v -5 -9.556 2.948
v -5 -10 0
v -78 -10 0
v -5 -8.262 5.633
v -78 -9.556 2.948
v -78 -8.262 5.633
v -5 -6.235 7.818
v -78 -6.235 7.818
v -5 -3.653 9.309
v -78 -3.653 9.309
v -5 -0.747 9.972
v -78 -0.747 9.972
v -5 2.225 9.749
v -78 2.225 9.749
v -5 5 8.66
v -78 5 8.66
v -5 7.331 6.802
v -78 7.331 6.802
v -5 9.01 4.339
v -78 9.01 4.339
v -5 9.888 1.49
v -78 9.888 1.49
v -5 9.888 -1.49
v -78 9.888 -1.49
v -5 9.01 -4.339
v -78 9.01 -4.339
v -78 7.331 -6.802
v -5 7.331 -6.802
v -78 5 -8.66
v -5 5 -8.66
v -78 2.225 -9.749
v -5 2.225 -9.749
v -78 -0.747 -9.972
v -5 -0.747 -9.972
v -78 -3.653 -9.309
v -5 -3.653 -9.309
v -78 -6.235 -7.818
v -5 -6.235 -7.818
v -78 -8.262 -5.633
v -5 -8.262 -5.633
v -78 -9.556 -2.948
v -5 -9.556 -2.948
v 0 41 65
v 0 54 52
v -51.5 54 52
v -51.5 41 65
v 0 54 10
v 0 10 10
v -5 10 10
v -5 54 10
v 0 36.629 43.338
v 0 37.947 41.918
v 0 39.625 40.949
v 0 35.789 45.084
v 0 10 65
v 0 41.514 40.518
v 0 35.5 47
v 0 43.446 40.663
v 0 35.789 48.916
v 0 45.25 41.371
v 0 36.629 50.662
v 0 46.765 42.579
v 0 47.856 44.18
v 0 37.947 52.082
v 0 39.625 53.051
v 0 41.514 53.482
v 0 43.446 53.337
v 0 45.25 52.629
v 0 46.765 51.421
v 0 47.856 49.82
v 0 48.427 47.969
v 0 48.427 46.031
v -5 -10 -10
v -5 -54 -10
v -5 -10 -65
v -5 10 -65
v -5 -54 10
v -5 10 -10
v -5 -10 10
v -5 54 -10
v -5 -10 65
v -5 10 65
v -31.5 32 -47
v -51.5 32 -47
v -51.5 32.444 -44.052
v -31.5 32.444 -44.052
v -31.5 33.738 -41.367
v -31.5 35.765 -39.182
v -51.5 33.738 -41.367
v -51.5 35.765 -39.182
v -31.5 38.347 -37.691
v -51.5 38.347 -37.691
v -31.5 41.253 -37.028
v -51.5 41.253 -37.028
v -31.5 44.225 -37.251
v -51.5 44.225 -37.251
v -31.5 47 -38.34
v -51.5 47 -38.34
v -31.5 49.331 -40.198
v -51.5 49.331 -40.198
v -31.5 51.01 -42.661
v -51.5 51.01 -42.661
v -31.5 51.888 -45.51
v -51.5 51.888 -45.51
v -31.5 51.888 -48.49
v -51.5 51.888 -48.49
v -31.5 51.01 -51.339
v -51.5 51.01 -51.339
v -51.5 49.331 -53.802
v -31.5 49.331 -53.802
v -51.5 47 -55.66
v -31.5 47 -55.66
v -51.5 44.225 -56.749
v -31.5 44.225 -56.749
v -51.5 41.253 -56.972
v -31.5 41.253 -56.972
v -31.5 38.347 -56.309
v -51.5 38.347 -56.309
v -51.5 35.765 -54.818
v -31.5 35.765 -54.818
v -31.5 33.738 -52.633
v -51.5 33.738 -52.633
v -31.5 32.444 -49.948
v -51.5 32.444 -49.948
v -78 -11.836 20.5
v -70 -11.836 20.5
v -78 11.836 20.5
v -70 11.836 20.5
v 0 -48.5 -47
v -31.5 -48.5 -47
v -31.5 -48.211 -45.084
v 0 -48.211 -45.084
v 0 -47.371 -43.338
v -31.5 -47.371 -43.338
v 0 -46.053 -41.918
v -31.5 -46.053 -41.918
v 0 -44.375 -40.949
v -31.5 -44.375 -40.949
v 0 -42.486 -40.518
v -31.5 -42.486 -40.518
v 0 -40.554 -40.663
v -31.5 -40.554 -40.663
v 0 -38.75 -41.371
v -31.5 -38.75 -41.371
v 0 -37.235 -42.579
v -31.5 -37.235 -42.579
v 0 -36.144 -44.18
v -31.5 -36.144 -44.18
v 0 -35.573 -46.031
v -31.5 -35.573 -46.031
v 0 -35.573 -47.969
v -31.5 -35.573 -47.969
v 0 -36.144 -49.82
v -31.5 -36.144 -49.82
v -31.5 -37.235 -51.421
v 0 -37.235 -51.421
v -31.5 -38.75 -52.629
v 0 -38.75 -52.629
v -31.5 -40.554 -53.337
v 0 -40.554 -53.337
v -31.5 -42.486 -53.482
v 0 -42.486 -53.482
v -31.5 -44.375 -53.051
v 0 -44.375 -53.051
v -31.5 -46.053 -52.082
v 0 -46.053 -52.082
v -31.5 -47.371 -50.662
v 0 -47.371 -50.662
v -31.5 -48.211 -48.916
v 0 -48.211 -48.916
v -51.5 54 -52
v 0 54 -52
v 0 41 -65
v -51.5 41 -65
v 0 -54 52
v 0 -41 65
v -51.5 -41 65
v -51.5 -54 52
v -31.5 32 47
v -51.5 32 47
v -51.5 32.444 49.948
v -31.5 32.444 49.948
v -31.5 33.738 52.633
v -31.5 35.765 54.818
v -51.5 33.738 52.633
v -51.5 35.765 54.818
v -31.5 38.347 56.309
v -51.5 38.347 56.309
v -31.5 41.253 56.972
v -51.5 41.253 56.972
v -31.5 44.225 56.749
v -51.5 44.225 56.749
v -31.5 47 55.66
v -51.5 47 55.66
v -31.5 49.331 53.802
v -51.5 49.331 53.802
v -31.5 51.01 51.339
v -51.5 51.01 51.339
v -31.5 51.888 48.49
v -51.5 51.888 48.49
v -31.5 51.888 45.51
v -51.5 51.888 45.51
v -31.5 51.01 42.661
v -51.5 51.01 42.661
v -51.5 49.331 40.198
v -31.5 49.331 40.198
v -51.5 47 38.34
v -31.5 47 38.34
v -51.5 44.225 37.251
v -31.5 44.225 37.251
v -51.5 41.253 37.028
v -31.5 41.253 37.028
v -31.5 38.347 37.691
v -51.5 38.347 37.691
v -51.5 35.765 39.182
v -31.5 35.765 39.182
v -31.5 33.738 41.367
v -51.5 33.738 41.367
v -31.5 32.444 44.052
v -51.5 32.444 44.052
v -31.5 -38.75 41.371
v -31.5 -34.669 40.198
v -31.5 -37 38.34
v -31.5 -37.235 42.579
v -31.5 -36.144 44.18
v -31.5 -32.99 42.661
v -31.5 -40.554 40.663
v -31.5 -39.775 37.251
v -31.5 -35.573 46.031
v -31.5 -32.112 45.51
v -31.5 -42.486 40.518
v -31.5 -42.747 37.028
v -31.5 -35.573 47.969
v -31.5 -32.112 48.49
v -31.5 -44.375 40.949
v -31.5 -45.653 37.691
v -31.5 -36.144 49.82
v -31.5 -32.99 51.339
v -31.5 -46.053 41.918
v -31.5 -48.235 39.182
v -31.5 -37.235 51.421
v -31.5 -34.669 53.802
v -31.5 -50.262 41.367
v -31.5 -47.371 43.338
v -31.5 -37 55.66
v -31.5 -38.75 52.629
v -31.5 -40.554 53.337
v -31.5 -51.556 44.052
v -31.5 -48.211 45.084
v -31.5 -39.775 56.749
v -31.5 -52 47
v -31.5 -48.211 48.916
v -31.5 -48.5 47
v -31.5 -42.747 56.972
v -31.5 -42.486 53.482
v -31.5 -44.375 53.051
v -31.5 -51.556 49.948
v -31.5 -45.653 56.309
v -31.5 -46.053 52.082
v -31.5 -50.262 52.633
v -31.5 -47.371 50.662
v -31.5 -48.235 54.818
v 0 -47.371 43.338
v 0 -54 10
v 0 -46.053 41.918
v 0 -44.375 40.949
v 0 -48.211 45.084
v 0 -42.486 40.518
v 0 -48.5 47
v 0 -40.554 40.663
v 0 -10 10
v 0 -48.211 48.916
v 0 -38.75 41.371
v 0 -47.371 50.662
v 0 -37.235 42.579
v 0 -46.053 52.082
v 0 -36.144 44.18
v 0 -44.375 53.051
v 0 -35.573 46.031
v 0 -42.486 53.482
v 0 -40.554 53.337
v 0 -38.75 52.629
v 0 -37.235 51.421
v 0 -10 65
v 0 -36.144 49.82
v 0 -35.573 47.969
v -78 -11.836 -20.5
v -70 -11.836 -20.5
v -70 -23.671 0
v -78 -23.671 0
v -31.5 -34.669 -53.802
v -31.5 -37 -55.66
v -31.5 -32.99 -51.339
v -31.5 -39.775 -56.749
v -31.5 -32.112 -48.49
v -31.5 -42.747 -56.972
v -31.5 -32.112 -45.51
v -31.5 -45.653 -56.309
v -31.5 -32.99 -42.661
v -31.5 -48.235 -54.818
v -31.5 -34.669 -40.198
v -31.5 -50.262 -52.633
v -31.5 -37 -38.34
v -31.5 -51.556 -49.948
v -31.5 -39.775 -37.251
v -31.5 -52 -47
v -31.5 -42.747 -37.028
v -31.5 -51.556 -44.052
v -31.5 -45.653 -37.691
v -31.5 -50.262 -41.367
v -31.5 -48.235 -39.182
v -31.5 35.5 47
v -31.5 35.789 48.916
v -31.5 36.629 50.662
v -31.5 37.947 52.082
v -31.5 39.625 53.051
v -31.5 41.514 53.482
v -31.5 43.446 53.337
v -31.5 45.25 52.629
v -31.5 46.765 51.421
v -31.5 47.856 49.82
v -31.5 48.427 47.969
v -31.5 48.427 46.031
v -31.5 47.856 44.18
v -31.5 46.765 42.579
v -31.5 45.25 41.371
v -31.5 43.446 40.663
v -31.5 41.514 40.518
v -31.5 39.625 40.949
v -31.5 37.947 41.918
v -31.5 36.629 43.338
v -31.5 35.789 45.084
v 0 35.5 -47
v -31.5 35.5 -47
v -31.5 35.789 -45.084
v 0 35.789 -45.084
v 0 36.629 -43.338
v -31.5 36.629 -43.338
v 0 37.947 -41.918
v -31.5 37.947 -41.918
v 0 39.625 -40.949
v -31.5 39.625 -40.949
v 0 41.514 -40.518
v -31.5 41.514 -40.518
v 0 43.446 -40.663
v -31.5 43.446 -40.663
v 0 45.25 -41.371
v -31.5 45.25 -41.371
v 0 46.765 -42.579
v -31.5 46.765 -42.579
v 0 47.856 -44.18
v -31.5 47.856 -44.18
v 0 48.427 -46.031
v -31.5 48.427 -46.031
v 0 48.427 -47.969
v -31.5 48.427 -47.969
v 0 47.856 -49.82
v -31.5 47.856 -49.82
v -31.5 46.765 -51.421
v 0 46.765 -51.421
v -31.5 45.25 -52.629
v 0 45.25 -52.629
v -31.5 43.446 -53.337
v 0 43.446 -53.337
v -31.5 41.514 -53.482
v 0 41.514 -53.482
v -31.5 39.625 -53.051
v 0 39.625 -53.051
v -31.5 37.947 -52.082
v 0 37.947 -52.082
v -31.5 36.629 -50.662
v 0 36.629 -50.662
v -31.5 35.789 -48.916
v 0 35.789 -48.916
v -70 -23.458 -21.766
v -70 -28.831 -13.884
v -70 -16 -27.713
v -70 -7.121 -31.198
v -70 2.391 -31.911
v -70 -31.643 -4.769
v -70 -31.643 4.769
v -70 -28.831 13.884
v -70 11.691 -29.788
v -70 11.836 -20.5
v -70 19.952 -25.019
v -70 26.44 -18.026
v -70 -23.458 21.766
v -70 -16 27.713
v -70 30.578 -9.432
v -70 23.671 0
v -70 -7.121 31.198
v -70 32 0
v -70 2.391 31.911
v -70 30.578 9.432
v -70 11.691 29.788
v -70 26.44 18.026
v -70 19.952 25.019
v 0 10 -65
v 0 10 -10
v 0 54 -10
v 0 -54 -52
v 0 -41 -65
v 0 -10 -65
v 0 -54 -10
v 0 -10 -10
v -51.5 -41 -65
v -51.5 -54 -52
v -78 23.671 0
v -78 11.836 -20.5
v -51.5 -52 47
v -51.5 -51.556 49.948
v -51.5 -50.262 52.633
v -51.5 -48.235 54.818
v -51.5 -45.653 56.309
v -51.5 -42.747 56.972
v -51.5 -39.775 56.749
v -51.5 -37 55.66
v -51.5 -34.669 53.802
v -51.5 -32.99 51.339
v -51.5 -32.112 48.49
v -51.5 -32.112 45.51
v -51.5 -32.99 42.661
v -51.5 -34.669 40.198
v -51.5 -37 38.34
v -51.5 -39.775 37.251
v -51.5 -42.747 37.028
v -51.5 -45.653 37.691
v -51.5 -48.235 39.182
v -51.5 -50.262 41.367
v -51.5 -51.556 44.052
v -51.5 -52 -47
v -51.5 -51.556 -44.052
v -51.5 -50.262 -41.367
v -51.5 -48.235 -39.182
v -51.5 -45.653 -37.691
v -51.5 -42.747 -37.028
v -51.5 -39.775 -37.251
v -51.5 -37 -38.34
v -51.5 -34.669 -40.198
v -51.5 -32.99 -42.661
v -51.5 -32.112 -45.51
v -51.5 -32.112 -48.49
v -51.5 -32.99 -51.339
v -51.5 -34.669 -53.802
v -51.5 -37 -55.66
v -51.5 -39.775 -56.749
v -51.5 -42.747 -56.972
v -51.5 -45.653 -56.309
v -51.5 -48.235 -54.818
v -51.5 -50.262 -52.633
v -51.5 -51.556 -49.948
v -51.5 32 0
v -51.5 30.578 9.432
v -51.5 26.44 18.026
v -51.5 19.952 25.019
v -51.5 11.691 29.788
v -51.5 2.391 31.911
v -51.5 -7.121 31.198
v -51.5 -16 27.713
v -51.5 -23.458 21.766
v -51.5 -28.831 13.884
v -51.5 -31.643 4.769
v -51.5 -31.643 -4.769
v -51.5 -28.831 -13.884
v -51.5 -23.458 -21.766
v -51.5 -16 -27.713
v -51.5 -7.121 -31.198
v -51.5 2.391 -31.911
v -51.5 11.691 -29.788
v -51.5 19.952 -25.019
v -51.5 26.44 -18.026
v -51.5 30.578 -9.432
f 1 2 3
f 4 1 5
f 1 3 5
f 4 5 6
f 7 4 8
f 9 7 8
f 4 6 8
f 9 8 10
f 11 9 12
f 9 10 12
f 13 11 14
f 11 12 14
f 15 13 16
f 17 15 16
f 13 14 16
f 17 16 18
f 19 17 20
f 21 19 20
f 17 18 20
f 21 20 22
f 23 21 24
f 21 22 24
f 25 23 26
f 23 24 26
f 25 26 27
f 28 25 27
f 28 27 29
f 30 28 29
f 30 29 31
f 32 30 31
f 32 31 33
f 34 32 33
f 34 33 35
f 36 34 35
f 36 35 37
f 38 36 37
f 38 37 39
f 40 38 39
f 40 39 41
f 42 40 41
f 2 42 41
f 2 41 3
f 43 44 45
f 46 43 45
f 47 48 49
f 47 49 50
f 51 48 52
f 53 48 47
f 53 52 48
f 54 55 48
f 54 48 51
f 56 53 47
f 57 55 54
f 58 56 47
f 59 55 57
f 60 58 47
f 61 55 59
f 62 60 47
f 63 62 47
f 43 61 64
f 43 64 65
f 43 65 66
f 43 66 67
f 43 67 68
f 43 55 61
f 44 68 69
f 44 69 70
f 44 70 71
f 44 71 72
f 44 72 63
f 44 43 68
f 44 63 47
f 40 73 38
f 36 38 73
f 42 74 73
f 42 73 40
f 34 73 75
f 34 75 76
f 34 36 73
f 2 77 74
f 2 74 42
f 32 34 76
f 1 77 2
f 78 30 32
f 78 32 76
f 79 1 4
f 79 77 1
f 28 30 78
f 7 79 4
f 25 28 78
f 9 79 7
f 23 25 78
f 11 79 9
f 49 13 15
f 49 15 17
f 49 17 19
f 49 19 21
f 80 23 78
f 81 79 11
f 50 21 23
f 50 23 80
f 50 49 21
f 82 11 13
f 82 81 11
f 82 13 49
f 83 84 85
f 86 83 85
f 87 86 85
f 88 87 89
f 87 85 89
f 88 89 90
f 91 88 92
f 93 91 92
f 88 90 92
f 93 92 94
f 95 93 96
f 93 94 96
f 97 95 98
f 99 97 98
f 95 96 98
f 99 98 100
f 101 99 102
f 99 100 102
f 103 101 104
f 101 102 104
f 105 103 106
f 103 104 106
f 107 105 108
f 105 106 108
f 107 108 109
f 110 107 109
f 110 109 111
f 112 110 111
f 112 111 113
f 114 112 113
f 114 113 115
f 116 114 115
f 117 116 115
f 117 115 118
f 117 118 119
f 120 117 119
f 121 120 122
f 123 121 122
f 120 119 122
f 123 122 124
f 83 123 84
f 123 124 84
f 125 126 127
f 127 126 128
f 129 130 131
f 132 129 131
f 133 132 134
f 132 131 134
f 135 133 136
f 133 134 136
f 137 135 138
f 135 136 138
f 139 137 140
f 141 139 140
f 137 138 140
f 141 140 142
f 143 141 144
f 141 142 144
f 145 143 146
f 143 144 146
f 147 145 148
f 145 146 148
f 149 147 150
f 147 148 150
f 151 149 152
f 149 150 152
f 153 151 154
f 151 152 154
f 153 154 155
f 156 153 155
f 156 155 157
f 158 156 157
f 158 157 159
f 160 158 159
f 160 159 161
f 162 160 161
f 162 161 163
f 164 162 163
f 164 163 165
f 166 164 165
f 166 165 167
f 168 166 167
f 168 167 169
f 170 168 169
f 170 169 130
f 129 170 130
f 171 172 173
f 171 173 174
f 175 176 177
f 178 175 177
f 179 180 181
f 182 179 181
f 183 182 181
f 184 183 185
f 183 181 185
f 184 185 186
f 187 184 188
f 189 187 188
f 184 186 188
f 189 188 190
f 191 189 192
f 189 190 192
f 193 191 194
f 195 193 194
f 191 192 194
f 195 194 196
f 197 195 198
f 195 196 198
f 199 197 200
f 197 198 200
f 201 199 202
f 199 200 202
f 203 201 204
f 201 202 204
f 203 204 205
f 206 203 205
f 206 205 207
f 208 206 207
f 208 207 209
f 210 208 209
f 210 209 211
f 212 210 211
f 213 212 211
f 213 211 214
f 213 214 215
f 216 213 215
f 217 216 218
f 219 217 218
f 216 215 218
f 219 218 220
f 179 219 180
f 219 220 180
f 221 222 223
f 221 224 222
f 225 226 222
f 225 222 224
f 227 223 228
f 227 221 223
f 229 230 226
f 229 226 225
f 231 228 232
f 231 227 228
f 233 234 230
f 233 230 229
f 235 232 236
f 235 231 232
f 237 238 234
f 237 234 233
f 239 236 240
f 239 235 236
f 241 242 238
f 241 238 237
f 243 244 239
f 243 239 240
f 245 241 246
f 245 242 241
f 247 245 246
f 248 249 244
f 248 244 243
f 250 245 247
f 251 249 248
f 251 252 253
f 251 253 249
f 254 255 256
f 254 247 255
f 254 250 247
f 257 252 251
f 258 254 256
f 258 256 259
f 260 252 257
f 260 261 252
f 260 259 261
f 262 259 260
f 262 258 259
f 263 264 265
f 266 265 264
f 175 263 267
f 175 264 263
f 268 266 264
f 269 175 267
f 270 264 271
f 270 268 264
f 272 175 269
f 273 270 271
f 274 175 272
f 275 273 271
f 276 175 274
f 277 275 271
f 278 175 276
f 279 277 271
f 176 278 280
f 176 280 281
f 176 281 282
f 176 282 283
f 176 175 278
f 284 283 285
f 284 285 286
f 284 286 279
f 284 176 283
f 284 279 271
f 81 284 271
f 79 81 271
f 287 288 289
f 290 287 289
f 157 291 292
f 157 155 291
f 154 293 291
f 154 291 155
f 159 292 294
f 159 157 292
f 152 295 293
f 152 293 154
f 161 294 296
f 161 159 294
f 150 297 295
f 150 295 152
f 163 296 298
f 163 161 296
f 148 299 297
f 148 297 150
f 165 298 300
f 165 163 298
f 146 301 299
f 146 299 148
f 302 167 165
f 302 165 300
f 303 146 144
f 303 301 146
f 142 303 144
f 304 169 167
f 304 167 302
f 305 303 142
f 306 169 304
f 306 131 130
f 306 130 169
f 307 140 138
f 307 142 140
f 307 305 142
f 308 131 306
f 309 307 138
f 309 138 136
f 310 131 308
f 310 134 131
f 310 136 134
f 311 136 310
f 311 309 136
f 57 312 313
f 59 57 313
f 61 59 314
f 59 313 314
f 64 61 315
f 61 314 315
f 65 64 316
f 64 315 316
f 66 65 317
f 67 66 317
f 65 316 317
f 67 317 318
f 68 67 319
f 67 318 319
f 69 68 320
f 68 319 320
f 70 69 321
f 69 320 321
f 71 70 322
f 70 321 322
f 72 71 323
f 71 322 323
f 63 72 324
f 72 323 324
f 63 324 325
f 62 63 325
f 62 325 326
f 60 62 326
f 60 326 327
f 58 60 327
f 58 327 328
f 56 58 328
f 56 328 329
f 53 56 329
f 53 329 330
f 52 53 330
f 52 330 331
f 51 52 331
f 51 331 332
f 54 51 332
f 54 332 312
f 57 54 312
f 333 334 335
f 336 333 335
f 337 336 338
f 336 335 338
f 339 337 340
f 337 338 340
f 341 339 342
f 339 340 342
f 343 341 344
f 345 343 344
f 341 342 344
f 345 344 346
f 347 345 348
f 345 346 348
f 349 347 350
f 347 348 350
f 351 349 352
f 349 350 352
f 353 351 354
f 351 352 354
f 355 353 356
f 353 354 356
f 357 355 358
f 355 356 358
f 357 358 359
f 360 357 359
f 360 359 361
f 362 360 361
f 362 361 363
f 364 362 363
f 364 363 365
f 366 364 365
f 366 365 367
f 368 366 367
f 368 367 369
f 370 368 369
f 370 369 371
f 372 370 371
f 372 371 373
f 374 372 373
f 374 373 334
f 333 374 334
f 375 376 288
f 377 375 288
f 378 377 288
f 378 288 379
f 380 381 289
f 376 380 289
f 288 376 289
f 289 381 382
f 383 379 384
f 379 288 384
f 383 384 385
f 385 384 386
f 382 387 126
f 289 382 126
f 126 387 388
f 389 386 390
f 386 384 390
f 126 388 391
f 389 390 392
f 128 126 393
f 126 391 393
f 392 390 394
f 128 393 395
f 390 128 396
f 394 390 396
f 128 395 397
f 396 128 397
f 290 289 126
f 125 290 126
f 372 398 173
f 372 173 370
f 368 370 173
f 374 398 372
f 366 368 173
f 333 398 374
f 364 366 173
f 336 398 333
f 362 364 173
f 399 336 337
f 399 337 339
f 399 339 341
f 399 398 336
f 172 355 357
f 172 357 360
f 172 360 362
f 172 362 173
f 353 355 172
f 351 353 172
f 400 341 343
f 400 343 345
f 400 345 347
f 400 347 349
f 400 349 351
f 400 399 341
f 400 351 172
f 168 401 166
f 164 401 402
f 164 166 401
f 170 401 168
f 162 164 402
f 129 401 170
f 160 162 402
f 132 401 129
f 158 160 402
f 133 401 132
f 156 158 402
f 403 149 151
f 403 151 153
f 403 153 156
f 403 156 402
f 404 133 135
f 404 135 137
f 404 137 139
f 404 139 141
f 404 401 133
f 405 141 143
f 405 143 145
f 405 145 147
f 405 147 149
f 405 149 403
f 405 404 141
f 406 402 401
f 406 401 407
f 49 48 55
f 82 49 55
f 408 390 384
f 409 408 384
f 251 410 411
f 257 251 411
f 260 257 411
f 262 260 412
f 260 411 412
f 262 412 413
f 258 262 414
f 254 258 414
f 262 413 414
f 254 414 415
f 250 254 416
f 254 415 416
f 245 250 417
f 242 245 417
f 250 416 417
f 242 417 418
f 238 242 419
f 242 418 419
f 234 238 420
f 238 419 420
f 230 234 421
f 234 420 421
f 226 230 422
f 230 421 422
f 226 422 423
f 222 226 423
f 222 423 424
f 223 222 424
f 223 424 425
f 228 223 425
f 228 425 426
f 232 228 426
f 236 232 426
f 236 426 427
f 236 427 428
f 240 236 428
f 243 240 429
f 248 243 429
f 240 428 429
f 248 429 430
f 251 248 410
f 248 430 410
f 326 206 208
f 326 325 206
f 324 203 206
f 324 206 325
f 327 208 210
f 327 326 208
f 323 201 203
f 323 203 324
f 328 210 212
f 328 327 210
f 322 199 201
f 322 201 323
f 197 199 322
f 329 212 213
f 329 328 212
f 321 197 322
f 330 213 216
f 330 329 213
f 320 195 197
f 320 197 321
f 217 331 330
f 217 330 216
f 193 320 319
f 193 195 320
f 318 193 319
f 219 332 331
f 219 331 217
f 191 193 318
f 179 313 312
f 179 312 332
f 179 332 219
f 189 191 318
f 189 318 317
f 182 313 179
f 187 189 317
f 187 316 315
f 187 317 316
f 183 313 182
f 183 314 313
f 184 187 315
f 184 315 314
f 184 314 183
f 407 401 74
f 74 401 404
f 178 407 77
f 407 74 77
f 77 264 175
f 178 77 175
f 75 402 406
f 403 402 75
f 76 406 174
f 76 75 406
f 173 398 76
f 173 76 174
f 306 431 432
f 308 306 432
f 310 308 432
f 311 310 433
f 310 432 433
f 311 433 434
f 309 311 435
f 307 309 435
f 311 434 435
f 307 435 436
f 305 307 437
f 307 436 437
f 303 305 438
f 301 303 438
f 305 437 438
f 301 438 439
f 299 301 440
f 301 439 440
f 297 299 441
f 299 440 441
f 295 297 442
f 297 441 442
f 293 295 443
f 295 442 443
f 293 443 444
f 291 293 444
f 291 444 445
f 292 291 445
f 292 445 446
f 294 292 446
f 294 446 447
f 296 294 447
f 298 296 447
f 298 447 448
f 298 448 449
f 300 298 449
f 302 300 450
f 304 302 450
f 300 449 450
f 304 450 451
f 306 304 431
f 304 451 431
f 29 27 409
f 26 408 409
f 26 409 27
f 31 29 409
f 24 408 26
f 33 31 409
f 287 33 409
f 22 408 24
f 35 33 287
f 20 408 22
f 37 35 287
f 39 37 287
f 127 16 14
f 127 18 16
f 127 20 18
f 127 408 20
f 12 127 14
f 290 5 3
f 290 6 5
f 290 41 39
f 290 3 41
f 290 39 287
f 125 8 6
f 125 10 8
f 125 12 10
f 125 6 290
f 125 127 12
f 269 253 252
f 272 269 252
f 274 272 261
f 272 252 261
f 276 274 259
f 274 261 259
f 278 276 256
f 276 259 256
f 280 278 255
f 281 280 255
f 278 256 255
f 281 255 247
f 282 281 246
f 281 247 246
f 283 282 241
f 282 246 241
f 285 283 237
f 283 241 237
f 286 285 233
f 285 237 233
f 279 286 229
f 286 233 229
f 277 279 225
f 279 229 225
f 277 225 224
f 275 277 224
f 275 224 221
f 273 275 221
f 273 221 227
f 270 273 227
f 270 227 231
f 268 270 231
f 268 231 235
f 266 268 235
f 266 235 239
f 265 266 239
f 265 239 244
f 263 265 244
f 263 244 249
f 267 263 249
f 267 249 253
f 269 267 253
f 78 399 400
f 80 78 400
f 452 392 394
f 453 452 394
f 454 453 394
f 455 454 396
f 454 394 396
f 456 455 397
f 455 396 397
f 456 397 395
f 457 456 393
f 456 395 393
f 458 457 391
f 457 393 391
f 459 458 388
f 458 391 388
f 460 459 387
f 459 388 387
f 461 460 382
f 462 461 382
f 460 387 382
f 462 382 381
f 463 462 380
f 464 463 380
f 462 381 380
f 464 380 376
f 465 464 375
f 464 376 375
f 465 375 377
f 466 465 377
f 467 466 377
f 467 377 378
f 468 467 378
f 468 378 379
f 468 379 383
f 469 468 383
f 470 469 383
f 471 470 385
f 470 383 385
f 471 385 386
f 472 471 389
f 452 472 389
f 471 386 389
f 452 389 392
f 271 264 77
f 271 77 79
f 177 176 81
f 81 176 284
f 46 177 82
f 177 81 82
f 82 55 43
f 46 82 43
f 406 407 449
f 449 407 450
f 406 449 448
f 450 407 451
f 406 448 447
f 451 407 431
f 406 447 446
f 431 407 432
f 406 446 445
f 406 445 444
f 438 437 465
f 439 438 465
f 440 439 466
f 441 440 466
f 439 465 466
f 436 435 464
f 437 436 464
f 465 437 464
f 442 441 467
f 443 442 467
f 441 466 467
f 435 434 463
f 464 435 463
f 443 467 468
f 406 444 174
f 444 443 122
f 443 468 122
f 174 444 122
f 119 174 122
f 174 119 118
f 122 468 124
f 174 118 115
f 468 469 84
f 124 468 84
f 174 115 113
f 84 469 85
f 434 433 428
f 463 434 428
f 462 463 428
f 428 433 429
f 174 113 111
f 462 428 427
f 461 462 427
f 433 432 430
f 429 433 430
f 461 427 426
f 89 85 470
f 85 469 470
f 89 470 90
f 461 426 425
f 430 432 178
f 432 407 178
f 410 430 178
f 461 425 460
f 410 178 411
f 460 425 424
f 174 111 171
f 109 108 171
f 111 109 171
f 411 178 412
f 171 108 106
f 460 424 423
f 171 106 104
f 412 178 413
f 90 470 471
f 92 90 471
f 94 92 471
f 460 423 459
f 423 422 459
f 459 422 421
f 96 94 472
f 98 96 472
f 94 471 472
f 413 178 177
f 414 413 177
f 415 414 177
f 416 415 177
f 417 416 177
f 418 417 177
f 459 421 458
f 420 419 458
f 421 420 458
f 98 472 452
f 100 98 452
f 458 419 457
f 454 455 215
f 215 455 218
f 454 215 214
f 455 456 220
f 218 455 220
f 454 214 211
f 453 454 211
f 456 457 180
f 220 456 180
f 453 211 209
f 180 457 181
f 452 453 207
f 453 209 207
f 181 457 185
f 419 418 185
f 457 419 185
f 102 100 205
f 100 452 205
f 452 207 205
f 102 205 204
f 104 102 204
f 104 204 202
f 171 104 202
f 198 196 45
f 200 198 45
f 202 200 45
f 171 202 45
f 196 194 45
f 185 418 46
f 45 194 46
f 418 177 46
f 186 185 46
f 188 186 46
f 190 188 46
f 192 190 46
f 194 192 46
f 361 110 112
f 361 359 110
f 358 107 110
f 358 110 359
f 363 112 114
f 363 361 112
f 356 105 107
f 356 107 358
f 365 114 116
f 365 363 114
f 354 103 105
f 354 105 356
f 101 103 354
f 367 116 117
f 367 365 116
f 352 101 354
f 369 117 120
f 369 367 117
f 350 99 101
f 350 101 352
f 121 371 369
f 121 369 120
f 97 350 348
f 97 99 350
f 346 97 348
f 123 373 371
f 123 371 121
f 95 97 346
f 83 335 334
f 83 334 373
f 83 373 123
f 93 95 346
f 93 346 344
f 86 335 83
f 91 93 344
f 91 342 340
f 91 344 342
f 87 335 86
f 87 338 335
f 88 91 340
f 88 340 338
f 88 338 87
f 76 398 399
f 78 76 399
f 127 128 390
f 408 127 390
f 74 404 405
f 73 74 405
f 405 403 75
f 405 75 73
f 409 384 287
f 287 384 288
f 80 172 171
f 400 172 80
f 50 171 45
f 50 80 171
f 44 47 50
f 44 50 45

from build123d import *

# Parameters (mm, degrees)
F0_W      = 108
F0_H      = 130
F1_DEPTH  = 51.5
F2_R      = 6.5
F3_DEPTH  = 51.501
F4_R      = 10
F5_DEPTH  = 20
F7_R      = 32
F8_DEPTH  = 18.5
F10_DEPTH = 8
F11_R     = 10
F12_DEPTH = 78.001
F13_SIZE  = 13
F14_W     = 20
F14_H     = 55
F14_H_2   = 20
F14_W_2   = 44
F15_DEPTH = 5


with BuildPart() as f1:
    # F0 (on Right) → F1 (new body)
    with BuildSketch(Plane.YZ):
        Rectangle(F0_W, F0_H)
    extrude(amount=-F1_DEPTH)

    # F2 (on face) → F3 (cut, through all)
    with BuildSketch(Plane(origin=(-51.5, 0, 0), x_dir=(0, -1, 0), z_dir=(-1, 0, 0))):
        with Locations((42, 47)):
            Circle(F2_R)
        with Locations((-42, 47)):
            Circle(F2_R)
        with Locations((-42, -47)):
            Circle(F2_R)
        with Locations((42, -47)):
            Circle(F2_R)
    extrude(amount=-F3_DEPTH, mode=Mode.SUBTRACT)

    # F4 (on face) → F5 (cut)
    with BuildSketch(Plane(origin=(-51.5, 0, 0), x_dir=(0, -1, 0), z_dir=(-1, 0, 0))):
        with Locations((-42, 47)):
            Circle(F4_R)
        with Locations((-42, -47)):
            Circle(F4_R)
        with Locations((42, 47)):
            Circle(F4_R)
        with Locations((42, -47)):
            Circle(F4_R)
    extrude(amount=-F5_DEPTH, mode=Mode.SUBTRACT)

    # F7 (on offset) → F8 (join, through all)
    with BuildSketch(Plane.YZ.offset(-70)):
        Circle(F7_R)
    extrude(amount=F8_DEPTH)

    # F9 (on face) → F10 (join)
    with BuildSketch(Plane(origin=(-70, 0, 0), x_dir=(0, -1, 0), z_dir=(-1, 0, 0))):
        Polygon((23.6713610368, 0), (11.8356805184, 20.5), (-11.8356805184, 20.5), (-23.6713610368, 0), (-11.8356805184, -20.5), (11.8356805184, -20.5), align=None)
    extrude(amount=F10_DEPTH)

    # F11 (on face) → F12 (cut, through all)
    with BuildSketch(Plane(origin=(-78, 0, 0), x_dir=(0, -1, 0), z_dir=(-1, 0, 0))):
        Circle(F11_R)
    extrude(amount=-F12_DEPTH, mode=Mode.SUBTRACT)

    # F13
    f13_edges = [f1.edges().sort_by_distance(p)[0] for p in [
        (-25.75, -54, 65),
        (-25.75, 54, 65),
        (-25.75, -54, -65),
        (-25.75, 54, -65),
    ]]
    chamfer(f13_edges, length=F13_SIZE)

    # F14 (on face) → F15 (cut)
    with BuildSketch(Plane.YZ):
        with Locations((0, 37.5)):
            Rectangle(F14_W, F14_H)
        Rectangle(F14_W, F14_H_2)
        with Locations((-32, 0)):
            Rectangle(F14_W_2, F14_H_2)
        with Locations((32, 0)):
            Rectangle(F14_W_2, F14_H_2)
        with Locations((0, -37.5)):
            Rectangle(F14_W, F14_H)
    extrude(amount=-F15_DEPTH, mode=Mode.SUBTRACT)


solid = f1.part
